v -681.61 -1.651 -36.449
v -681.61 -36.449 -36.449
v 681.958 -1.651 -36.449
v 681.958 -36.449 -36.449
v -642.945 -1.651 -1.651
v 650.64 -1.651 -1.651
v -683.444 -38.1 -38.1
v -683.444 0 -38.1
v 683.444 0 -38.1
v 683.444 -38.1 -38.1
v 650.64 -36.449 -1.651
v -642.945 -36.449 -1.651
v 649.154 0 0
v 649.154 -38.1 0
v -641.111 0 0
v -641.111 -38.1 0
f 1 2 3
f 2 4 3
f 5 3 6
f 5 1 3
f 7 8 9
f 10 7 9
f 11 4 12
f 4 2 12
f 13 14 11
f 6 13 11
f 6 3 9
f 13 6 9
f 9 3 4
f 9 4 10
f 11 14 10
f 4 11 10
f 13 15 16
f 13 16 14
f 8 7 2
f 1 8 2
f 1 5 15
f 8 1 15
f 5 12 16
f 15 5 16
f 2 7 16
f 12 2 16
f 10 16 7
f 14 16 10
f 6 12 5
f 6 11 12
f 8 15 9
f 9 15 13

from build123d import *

# Parameters (mm, degrees)
F0_W          = 1366.8883
F0_H          = 38.1
F1_DEPTH      = 38.1
F2_W          = 34.798
F2_H          = 34.798
F3_DEPTH      = 683.44515
F3_DEPTH_BACK = 683.44515
F5_DEPTH      = 38.101


# Not quite as in the source:
# - a feature names something its author has since deleted; it is built from what else it names


with BuildPart() as f1:
    # F0 (on Front) → F1 (new body)
    with BuildSketch(Plane.XZ):
        with Locations((0, -19.05)):
            Rectangle(F0_W, F0_H)
    extrude(amount=F1_DEPTH)

    # F2 (on Right) → F3 (cut, two sides)
    with BuildSketch(Plane.YZ) as f3_sk:
        with Locations((-19.05, -19.05)):
            Rectangle(F2_W, F2_H)
    extrude(amount=-F3_DEPTH, mode=Mode.SUBTRACT)
    extrude(f3_sk.sketch, amount=F3_DEPTH_BACK, mode=Mode.SUBTRACT)

    # F4 (on face) → F5 (cut, through all)
    with BuildSketch(Plane.XZ.offset(38.1)):
        Polygon((649.1544057584, 0), (683.44415, -38.1), (683.44415, 0), align=None)
        Polygon((-683.44415, 0), (-683.44415, -38.1), (-641.1108166729, 0), align=None)
    extrude(amount=-F5_DEPTH, mode=Mode.SUBTRACT)


solid = f1.part
